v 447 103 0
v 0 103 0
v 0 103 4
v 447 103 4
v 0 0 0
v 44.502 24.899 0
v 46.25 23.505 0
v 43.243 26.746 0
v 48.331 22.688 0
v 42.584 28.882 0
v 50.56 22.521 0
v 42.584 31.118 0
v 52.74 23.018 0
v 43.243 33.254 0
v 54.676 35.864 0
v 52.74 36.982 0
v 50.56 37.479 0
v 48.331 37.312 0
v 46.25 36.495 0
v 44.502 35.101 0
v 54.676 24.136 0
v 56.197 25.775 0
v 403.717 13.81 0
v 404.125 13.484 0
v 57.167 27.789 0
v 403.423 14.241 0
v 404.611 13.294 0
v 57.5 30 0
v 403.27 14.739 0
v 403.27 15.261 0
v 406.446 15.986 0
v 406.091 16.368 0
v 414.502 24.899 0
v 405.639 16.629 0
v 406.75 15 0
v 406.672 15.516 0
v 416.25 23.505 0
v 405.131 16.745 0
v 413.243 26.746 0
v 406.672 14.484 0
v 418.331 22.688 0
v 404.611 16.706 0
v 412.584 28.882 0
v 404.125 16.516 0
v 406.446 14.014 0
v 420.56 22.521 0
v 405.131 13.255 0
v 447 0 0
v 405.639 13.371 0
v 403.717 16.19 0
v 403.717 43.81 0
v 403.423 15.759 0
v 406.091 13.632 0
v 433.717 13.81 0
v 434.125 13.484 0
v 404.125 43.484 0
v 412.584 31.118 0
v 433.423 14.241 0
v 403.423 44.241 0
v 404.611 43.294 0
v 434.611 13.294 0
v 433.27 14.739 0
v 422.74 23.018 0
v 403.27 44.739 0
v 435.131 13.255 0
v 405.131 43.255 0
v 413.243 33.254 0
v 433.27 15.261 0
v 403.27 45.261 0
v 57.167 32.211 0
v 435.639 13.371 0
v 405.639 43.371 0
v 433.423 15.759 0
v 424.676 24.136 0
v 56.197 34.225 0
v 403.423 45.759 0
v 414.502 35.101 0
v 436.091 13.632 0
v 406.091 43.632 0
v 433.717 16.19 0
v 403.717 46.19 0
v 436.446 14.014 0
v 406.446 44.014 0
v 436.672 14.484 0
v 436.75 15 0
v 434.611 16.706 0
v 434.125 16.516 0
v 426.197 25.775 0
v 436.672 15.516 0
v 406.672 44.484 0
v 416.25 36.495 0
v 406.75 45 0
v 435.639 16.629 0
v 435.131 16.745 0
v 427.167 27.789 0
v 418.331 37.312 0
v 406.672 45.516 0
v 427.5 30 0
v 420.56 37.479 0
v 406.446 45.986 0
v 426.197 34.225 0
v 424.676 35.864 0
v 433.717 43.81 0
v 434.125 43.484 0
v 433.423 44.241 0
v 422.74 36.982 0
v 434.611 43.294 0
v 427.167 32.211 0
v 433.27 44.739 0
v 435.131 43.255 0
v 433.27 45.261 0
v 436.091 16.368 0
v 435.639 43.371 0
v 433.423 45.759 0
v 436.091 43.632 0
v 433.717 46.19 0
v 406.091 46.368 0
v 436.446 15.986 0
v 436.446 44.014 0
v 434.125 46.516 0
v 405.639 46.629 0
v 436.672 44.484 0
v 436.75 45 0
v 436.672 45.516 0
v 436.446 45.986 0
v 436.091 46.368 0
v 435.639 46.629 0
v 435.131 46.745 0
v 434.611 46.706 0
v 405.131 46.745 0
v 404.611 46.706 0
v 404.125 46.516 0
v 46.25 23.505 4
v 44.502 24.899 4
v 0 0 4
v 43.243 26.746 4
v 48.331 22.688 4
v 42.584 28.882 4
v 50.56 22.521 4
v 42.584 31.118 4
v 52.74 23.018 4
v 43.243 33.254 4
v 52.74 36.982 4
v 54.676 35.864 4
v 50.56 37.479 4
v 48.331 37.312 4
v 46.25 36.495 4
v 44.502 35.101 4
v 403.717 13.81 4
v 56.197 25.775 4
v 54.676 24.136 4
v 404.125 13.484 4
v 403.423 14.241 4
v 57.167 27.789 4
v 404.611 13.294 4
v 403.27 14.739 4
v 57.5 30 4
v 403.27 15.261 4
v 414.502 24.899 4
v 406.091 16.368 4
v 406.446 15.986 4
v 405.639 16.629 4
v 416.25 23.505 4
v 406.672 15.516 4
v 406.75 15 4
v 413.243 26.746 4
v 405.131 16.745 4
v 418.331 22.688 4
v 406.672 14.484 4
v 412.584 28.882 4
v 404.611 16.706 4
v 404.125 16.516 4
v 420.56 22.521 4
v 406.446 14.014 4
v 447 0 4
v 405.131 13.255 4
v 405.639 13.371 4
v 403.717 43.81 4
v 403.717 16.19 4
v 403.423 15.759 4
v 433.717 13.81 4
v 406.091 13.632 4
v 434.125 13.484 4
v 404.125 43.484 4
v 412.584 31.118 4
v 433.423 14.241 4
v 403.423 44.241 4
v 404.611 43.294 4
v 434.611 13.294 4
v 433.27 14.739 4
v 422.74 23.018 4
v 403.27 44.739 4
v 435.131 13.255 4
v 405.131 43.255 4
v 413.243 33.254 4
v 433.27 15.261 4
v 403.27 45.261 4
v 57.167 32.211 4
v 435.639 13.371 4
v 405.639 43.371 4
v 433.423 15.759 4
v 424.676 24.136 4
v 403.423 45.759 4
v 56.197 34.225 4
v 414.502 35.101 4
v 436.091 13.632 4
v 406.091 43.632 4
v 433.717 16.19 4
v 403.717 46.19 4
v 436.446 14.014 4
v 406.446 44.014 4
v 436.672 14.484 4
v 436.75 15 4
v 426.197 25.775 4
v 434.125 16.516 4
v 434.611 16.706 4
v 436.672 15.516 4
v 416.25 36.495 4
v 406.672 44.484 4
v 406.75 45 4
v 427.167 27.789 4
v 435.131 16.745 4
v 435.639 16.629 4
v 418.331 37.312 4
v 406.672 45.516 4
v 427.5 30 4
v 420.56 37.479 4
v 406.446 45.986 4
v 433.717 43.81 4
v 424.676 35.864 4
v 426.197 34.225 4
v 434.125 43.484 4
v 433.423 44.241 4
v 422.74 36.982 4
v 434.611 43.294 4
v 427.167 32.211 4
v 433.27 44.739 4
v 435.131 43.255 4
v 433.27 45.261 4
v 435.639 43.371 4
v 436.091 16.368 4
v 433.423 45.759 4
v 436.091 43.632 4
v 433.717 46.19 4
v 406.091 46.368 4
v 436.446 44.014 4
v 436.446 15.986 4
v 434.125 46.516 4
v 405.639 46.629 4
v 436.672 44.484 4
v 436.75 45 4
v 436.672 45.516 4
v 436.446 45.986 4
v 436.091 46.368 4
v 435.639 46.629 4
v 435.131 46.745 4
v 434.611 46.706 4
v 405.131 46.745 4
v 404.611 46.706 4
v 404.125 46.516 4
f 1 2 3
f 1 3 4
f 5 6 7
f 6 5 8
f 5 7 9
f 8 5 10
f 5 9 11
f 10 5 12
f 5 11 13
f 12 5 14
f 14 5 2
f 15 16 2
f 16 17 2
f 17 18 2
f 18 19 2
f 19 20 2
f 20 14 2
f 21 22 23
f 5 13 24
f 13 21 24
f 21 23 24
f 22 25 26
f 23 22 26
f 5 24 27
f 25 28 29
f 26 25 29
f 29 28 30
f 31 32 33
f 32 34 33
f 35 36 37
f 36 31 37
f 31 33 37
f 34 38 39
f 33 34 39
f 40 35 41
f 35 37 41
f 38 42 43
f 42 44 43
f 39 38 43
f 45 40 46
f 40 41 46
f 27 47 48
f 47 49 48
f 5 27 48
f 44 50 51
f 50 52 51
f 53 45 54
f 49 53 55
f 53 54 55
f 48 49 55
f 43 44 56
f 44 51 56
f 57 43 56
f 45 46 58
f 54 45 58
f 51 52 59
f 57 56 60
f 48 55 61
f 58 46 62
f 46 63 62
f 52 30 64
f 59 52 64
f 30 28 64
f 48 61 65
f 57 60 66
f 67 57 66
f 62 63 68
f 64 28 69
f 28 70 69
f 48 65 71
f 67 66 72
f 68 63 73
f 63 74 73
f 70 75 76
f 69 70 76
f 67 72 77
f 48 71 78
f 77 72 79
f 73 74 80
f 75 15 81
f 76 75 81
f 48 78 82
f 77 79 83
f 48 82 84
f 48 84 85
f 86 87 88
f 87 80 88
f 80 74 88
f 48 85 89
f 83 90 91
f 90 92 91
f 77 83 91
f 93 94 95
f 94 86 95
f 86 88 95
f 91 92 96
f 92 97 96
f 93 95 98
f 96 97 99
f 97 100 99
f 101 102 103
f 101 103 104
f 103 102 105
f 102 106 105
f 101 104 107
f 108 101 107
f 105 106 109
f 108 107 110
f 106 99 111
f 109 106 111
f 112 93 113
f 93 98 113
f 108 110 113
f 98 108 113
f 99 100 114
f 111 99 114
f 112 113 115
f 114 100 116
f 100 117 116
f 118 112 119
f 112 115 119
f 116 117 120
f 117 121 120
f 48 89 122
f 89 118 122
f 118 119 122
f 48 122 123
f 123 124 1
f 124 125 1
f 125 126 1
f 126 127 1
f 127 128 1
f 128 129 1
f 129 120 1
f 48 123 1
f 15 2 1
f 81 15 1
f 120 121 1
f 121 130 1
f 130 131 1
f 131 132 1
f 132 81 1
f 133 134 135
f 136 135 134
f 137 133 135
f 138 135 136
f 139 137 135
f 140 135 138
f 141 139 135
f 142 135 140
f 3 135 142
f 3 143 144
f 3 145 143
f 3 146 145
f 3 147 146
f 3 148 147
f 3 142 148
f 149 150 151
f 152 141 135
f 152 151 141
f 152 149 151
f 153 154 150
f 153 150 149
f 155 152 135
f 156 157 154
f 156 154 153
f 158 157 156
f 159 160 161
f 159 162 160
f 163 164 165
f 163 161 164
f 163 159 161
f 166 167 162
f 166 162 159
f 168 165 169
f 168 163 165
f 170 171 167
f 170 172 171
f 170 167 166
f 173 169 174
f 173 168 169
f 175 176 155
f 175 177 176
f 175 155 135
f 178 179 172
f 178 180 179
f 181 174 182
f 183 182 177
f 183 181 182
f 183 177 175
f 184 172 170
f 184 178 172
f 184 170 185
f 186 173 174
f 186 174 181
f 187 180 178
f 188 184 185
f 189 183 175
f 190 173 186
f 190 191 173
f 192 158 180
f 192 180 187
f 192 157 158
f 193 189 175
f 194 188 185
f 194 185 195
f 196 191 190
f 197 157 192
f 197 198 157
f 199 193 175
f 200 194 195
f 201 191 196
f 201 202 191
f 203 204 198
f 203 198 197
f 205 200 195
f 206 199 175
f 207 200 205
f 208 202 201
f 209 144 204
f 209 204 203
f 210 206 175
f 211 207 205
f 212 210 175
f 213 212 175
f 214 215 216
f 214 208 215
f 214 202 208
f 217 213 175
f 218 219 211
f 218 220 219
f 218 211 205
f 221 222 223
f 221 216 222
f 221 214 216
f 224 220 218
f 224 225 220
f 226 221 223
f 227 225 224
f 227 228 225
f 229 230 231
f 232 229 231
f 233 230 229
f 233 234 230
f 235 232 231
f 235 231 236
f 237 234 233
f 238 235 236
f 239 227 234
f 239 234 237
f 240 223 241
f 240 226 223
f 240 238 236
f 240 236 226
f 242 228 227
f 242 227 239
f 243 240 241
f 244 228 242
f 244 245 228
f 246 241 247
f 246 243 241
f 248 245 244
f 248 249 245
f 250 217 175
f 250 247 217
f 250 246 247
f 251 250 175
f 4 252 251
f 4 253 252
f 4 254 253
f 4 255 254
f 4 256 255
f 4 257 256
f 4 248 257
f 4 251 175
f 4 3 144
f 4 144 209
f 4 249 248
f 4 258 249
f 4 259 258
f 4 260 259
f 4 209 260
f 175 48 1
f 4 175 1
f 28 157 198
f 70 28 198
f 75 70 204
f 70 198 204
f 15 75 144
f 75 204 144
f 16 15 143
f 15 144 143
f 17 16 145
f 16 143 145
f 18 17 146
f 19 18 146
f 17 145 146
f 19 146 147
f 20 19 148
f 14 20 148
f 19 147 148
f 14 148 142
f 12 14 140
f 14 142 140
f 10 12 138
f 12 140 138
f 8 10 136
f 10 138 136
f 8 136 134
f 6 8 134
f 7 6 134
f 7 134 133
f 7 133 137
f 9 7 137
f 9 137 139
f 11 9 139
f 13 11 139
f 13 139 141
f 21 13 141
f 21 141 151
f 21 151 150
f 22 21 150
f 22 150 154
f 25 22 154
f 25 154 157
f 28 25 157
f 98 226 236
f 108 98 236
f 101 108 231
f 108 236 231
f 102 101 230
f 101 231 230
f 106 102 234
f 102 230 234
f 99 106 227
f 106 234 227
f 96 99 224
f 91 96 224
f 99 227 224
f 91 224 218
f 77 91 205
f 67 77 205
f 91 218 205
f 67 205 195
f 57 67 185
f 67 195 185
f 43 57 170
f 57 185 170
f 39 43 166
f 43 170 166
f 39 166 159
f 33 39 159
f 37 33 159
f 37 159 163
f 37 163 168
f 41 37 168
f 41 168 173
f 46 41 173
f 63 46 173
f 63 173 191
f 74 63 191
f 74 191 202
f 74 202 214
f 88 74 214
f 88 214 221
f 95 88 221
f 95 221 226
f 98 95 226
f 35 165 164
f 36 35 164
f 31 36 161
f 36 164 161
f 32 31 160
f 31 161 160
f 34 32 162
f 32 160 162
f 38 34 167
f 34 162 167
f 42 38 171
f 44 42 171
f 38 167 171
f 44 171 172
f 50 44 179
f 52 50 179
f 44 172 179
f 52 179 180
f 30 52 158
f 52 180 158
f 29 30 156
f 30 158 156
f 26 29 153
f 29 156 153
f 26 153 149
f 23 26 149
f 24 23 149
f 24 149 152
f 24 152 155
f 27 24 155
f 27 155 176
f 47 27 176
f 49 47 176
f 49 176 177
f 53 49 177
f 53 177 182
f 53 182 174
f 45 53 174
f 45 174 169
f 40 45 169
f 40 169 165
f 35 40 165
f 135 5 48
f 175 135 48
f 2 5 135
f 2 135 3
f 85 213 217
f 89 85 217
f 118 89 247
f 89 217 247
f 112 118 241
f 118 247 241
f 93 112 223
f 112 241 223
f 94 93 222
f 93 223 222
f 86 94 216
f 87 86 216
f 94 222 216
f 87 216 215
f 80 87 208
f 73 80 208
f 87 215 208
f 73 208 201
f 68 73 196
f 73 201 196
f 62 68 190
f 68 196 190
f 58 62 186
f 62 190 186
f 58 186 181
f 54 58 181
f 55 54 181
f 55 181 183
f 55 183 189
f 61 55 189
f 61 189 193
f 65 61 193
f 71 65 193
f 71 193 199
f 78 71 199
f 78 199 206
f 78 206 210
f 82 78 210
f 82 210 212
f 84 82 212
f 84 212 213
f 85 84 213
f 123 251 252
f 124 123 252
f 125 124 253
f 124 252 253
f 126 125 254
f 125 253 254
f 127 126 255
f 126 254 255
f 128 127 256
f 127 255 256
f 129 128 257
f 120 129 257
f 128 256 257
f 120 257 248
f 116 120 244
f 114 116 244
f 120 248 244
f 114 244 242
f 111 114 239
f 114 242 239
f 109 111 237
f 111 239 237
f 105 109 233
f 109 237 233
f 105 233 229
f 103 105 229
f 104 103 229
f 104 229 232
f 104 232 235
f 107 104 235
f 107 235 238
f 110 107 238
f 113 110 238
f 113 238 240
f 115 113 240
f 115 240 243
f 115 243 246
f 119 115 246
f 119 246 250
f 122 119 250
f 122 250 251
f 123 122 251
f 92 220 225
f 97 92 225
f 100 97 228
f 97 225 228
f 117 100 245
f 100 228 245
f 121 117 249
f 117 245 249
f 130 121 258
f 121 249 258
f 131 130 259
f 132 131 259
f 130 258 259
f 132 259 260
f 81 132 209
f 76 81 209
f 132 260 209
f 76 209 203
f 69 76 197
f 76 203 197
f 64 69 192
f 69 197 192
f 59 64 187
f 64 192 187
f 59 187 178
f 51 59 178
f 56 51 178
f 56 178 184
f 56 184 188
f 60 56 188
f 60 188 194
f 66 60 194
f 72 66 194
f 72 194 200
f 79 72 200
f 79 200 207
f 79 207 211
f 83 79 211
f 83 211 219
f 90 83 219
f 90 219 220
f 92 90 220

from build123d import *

# Parameters (mm, degrees)
SKETCH1_W           = 450
SKETCH1_H           = 103
BOSS_EXTRUDE1_DEPTH = 4
SKETCH6_R           = 7.5
CUT_EXTRUDE4_DEPTH  = 5
SKETCH7_R           = 7.5
CUT_EXTRUDE5_DEPTH  = 5
SKETCH8_R           = 1.75
CUT_EXTRUDE6_DEPTH  = 5
SKETCH10_W          = 3
SKETCH10_H          = 103
CUT_EXTRUDE7_DEPTH  = 10


with BuildPart() as part:
    # Sketch1 → Boss-Extrude1 (new body)
    with BuildSketch(Plane.XY):
        with Locations((225, 51.5)):
            Rectangle(SKETCH1_W, SKETCH1_H)
    extrude(amount=BOSS_EXTRUDE1_DEPTH)

    # Sketch6 → Cut-Extrude4 (cut, through all)
    with BuildSketch(Plane.XY.offset(4)):
        with Locations((50, 30)):
            Circle(SKETCH6_R)
    extrude(amount=-CUT_EXTRUDE4_DEPTH, mode=Mode.SUBTRACT)

    # Sketch7 → Cut-Extrude5 (cut, through all)
    with BuildSketch(Plane.XY.offset(4)):
        with Locations((420, 30)):
            Circle(SKETCH7_R)
    extrude(amount=-CUT_EXTRUDE5_DEPTH, mode=Mode.SUBTRACT)

    # Sketch8 → Cut-Extrude6 (cut, through all)
    with BuildSketch(Plane.XY.offset(4)):
        with Locations((435, 45)):
            Circle(SKETCH8_R)
        with Locations((405, 45)):
            Circle(SKETCH8_R)
        with Locations((405, 15)):
            Circle(SKETCH8_R)
        with Locations((435, 15)):
            Circle(SKETCH8_R)
    extrude(amount=-CUT_EXTRUDE6_DEPTH, mode=Mode.SUBTRACT)

    # Sketch10 → Cut-Extrude7 (cut)
    with BuildSketch(Plane(origin=(0, 0, 0), x_dir=(-1, 0, 0), z_dir=(0, 0, -1))):
        with Locations((-448.5, 51.5)):
            Rectangle(SKETCH10_W, SKETCH10_H)
    extrude(amount=-CUT_EXTRUDE7_DEPTH, mode=Mode.SUBTRACT)


solid = part.part
